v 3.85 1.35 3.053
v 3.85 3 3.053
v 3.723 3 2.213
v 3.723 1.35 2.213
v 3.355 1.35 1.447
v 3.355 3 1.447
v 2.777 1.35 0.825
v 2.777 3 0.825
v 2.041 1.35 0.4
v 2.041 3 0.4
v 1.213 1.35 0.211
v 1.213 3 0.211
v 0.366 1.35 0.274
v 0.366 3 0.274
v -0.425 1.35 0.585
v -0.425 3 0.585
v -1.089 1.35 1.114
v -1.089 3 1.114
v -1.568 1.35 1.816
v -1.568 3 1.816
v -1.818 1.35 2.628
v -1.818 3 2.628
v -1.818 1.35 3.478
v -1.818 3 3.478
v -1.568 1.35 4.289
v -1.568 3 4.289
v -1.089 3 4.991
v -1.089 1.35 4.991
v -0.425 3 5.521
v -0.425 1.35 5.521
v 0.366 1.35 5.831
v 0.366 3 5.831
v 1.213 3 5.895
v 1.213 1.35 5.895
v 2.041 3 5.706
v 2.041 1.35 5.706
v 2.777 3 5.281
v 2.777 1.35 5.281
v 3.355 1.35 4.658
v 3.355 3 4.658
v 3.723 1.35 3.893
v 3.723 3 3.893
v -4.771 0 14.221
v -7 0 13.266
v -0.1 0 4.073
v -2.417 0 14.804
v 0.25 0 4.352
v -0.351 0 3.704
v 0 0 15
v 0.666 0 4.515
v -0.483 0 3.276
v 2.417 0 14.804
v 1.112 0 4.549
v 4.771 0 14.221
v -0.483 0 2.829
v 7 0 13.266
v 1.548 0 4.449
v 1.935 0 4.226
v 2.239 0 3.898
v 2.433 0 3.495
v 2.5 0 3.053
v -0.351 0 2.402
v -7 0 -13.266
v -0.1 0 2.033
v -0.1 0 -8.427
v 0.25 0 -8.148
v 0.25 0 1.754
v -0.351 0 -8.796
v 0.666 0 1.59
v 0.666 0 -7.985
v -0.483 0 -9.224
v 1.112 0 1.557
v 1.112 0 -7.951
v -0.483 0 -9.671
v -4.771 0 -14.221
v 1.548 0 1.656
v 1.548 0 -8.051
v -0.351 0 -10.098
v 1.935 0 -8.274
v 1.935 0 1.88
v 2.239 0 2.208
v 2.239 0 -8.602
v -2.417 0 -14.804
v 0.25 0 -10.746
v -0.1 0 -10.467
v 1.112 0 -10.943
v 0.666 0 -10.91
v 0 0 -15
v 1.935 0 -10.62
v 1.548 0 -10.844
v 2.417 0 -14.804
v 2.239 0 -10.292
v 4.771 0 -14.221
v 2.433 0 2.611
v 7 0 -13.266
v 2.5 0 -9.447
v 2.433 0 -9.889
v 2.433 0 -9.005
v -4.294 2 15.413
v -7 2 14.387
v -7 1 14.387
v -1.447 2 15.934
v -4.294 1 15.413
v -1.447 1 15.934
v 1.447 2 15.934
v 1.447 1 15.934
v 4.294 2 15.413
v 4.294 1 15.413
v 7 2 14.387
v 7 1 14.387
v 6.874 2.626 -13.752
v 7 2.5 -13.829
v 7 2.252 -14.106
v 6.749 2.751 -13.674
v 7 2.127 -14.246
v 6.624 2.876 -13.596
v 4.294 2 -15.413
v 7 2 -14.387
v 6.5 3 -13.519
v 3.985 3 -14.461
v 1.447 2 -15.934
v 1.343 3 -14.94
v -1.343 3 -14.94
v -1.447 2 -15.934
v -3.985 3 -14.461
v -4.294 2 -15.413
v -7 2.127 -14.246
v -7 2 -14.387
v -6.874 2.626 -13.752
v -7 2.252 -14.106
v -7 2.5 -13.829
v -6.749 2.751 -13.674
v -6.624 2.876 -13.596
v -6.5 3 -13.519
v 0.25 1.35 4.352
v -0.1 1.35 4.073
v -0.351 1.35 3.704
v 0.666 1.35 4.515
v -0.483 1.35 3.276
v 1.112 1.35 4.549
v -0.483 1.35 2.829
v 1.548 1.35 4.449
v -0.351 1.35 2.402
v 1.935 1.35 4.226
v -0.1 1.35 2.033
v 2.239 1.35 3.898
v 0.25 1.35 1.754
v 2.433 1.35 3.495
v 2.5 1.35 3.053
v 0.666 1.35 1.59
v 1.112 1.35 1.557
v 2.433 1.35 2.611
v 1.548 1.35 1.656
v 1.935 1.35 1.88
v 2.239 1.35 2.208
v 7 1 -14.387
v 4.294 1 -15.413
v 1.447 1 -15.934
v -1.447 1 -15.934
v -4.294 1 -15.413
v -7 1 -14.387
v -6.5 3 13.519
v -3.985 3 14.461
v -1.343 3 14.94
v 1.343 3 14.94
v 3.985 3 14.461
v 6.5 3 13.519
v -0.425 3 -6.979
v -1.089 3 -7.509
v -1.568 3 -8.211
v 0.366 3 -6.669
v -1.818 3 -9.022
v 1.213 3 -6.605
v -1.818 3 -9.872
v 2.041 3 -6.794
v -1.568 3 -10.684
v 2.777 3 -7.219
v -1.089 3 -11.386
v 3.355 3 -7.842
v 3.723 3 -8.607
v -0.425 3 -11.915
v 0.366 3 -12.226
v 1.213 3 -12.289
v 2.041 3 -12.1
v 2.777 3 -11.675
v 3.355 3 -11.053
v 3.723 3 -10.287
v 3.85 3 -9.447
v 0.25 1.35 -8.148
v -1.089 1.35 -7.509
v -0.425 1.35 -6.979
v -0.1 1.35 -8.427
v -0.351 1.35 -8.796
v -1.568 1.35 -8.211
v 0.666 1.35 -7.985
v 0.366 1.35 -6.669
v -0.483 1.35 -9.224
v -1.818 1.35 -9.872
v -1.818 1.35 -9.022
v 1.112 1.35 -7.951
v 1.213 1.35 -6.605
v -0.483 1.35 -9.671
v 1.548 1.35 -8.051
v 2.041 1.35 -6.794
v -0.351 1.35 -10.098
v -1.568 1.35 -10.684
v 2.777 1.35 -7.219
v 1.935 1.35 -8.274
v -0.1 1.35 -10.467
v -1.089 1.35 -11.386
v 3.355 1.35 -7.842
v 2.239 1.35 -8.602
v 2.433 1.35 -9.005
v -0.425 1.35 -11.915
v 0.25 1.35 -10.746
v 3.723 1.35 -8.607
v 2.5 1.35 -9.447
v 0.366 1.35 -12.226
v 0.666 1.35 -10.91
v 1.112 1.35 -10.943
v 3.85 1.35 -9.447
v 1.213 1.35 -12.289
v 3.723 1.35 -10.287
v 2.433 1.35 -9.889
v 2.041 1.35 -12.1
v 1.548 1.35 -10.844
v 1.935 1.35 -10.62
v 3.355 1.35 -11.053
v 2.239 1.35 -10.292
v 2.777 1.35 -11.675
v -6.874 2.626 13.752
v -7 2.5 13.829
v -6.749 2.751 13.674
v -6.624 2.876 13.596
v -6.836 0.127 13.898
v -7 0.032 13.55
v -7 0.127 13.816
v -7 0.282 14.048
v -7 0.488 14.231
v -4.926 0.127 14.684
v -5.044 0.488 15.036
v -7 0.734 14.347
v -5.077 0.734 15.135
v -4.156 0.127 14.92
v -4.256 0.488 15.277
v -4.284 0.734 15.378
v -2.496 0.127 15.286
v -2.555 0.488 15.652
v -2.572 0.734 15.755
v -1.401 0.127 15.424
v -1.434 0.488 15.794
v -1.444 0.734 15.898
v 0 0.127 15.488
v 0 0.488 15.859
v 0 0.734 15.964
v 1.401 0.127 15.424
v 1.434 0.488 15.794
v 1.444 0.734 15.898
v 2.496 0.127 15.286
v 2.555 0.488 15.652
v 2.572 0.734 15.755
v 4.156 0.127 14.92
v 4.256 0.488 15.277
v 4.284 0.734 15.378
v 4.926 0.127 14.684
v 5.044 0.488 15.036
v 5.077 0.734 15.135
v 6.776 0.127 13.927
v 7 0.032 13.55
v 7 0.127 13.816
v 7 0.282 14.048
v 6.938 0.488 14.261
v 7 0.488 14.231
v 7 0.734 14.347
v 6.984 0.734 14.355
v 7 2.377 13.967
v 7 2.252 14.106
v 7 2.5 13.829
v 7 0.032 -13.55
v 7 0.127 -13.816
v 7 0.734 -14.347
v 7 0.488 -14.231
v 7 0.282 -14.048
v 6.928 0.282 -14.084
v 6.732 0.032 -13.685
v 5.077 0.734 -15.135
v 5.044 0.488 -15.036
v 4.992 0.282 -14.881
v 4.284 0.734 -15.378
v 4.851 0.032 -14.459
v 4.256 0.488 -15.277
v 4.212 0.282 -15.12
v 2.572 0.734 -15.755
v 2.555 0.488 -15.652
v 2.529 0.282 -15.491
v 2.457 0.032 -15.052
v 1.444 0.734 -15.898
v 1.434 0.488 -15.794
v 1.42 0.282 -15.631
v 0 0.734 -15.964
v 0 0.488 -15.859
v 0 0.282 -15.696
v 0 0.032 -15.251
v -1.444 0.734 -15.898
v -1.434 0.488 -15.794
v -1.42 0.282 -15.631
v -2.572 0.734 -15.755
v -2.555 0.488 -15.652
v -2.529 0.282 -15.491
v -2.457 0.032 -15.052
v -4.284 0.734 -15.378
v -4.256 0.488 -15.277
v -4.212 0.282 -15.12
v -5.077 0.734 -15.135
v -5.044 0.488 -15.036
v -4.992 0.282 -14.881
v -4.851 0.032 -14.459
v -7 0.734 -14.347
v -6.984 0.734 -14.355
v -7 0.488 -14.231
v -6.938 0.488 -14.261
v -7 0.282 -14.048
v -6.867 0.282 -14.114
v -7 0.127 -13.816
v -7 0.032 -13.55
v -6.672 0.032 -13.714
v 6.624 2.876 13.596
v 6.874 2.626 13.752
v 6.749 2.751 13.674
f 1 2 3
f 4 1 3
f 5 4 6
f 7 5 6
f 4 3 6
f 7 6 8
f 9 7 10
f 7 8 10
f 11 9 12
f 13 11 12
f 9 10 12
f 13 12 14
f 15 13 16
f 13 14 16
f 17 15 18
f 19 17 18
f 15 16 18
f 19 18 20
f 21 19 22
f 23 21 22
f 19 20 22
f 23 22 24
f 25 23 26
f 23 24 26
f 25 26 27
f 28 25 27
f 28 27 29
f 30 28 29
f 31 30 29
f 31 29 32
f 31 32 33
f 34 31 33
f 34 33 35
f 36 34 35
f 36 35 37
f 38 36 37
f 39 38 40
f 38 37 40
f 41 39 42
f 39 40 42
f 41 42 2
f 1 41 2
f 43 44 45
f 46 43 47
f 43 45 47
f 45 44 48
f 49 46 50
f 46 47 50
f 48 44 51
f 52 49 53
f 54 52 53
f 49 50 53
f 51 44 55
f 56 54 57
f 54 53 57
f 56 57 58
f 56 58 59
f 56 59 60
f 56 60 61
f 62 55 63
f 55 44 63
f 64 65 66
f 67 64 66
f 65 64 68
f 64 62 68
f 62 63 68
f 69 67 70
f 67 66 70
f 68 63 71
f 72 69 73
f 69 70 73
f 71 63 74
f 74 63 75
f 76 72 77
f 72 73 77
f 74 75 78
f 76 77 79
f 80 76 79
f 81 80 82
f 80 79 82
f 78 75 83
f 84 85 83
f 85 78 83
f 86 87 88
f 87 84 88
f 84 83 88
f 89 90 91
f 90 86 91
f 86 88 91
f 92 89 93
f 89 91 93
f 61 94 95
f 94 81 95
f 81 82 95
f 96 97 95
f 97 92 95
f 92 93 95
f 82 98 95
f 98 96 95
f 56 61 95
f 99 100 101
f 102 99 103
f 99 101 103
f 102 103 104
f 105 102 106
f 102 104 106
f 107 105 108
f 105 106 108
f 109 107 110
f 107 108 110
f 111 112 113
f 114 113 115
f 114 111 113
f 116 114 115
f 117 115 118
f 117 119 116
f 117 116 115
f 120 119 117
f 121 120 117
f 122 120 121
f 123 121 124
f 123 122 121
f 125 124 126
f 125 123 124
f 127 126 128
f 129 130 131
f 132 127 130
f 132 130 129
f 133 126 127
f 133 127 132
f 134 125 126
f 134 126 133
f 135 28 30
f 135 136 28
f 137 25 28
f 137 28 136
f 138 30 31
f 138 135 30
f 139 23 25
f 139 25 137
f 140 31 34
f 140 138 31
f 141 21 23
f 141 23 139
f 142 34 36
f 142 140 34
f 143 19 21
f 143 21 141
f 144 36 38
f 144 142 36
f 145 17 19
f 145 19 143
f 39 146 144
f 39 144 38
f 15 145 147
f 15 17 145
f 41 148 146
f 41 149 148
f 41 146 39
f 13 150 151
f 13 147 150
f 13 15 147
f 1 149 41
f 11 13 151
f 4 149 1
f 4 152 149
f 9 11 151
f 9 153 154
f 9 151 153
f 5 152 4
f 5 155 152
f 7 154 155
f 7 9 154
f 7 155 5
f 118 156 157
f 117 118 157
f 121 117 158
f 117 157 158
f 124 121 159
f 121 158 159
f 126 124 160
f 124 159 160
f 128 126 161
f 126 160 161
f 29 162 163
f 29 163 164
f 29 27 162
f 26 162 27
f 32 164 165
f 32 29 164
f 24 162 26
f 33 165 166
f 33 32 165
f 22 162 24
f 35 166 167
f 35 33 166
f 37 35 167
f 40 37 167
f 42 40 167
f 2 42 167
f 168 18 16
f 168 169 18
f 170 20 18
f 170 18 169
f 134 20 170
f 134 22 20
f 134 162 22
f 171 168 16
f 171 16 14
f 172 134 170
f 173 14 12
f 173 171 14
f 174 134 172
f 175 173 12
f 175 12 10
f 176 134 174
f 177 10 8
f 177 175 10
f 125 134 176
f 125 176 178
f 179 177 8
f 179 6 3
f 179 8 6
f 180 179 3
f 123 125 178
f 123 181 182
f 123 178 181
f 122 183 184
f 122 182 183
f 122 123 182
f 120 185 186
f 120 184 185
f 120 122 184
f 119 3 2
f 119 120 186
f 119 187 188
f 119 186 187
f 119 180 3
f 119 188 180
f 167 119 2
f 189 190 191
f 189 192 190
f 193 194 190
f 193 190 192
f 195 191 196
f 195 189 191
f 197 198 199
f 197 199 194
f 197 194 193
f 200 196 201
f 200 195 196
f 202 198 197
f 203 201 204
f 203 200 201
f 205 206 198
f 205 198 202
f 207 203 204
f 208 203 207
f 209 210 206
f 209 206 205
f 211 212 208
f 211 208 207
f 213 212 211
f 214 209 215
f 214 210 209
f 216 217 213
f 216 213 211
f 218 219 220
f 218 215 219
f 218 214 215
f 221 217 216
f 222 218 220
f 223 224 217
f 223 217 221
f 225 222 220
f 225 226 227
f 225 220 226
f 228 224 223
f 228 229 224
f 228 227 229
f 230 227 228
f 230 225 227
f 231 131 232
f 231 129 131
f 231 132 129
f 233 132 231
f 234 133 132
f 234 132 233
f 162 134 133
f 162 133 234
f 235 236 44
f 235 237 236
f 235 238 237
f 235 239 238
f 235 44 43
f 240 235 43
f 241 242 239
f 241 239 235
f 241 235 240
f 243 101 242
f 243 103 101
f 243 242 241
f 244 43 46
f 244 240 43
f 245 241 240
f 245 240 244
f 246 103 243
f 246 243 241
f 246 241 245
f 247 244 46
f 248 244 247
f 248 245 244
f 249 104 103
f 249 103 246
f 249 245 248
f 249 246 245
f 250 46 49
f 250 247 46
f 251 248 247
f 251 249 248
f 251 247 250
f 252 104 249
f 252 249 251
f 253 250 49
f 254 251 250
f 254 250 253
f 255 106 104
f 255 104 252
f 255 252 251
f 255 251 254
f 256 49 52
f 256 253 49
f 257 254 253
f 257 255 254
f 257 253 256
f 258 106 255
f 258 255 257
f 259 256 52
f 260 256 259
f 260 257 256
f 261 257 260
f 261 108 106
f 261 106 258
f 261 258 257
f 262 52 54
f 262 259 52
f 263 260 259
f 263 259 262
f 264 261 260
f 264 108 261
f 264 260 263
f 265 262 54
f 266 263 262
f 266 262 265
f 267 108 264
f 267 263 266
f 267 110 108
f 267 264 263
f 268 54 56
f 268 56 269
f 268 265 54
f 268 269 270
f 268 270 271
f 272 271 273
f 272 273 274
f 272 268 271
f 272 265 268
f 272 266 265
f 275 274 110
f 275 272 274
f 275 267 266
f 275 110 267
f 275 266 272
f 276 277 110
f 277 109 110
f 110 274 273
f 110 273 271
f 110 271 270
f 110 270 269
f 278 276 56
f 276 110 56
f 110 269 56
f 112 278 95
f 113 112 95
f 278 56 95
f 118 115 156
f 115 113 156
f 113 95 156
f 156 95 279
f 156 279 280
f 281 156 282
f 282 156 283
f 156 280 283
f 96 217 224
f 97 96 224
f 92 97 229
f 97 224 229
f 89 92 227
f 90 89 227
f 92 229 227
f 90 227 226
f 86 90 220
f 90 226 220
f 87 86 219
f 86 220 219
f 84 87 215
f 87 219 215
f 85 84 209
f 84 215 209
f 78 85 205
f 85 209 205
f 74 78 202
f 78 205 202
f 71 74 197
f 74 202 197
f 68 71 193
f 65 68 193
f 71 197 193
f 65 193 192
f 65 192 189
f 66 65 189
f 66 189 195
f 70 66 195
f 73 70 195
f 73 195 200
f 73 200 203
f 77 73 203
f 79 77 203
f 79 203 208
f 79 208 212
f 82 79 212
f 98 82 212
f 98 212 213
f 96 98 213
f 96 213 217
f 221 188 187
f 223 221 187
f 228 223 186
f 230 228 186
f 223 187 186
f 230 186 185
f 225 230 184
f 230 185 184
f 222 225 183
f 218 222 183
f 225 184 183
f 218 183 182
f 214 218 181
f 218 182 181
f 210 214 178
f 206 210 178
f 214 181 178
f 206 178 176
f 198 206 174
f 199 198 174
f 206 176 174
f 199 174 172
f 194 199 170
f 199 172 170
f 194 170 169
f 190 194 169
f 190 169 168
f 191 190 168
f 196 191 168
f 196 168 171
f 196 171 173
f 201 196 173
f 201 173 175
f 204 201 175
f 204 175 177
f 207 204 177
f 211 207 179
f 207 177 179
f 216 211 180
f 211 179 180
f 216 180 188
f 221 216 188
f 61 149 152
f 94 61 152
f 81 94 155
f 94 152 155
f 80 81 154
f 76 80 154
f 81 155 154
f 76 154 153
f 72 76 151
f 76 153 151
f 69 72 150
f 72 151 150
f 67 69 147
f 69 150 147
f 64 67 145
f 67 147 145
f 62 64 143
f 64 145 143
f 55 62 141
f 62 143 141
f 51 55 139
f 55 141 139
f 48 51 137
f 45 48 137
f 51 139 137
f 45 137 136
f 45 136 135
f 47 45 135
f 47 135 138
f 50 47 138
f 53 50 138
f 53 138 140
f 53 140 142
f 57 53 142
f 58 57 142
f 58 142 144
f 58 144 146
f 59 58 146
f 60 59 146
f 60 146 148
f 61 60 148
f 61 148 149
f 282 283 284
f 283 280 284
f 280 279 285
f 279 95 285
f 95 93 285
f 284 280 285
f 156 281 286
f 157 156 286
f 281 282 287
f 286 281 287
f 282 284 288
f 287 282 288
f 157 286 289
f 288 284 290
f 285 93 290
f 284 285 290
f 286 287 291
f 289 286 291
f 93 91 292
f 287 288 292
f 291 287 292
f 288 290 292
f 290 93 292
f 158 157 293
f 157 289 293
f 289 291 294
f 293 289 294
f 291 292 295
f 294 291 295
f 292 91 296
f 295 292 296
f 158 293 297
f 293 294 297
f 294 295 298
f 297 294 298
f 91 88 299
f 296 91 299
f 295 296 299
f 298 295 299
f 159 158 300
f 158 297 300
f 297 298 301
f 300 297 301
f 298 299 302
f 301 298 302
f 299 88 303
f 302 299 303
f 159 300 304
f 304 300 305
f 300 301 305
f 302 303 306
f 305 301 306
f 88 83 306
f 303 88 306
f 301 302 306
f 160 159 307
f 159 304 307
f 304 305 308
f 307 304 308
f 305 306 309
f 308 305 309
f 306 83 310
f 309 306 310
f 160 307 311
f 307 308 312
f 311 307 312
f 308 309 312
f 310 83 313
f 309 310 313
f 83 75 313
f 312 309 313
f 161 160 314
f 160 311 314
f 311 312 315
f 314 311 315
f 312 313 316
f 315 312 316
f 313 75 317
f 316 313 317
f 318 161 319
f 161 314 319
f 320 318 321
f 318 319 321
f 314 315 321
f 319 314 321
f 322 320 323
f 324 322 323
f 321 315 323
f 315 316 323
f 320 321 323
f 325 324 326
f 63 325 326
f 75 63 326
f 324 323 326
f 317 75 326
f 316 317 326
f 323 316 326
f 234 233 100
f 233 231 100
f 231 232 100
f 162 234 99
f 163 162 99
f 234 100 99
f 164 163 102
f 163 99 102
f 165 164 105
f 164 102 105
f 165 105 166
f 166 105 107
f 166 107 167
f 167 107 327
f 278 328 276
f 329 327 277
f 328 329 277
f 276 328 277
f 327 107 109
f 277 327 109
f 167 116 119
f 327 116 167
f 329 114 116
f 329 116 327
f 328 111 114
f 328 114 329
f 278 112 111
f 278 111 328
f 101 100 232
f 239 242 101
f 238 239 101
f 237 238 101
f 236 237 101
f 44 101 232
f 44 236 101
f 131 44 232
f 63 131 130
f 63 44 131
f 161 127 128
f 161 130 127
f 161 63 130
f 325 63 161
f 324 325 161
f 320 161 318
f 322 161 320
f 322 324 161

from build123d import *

# Parameters (mm, degrees)
SKETCH2_R           = 16
BOSS_EXTRUDE1_DEPTH = 3
SKETCH1_W           = 9
SKETCH1_H           = 32
CUT_EXTRUDE1_DEPTH  = 4
SKETCH3_R           = 1.5
CUT_EXTRUDE2_DEPTH  = 4
SKETCH4_R           = 2.85
CUT_EXTRUDE3_DEPTH  = 1.65
CHAMFER1_SIZE       = 0.5
FILLET1_R           = 1
CHAMFER2_SIZE       = 1


with BuildPart() as part:
    # Sketch2 → Boss-Extrude1 (new body)
    with BuildSketch(Plane(origin=(0, 0, 0), x_dir=(1, 0, 0), z_dir=(0, 1, 0))):
        Circle(SKETCH2_R)
    extrude(amount=BOSS_EXTRUDE1_DEPTH)

    # Sketch1 → Cut-Extrude1 (cut, through all)
    with BuildSketch(Plane(origin=(0, 0, 0), x_dir=(1, 0, 0), z_dir=(0, 1, 0))):
        with Locations((-11.5, 0)):
            Rectangle(SKETCH1_W, SKETCH1_H)
        with Locations((11.5, 0)):
            Rectangle(SKETCH1_W, SKETCH1_H)
    extrude(amount=CUT_EXTRUDE1_DEPTH, mode=Mode.SUBTRACT)

    # Sketch3 → Cut-Extrude2 (cut, through all)
    with BuildSketch(Plane(origin=(0, 3, 0), x_dir=(1, 0, 0), z_dir=(0, 1, 0))):
        with Locations((1, 9.4472)):
            Circle(SKETCH3_R)
        with Locations((1, -3.0528)):
            Circle(SKETCH3_R)
    extrude(amount=-CUT_EXTRUDE2_DEPTH, mode=Mode.SUBTRACT)

    # Sketch4 → Cut-Extrude3 (cut)
    with BuildSketch(Plane(origin=(0, 3, 0), x_dir=(1, 0, 0), z_dir=(0, 1, 0))):
        with Locations((1, 9.4472)):
            Circle(SKETCH4_R)
        with Locations((1, -3.0528)):
            Circle(SKETCH4_R)
    extrude(amount=-CUT_EXTRUDE3_DEPTH, mode=Mode.SUBTRACT)

    # Chamfer1
    chamfer1_edges = [part.edges().sort_by_distance(p)[0] for p in [
        (-7, 3, 0),
        (7, 3, 0),
    ]]
    chamfer(chamfer1_edges, length=CHAMFER1_SIZE)

    # Fillet1
    fillet1_edges = [part.edges().sort_by_distance(p)[0] for p in [
        (0, 0, -16),
        (0, 0, 16),
    ]]
    fillet(fillet1_edges, radius=FILLET1_R)

    # Chamfer2
    chamfer2_edges = [part.edges().sort_by_distance(p)[0] for p in [
        (0, 3, -16),
        (0, 3, 16),
    ]]
    chamfer(chamfer2_edges, length=CHAMFER2_SIZE)


solid = part.part
